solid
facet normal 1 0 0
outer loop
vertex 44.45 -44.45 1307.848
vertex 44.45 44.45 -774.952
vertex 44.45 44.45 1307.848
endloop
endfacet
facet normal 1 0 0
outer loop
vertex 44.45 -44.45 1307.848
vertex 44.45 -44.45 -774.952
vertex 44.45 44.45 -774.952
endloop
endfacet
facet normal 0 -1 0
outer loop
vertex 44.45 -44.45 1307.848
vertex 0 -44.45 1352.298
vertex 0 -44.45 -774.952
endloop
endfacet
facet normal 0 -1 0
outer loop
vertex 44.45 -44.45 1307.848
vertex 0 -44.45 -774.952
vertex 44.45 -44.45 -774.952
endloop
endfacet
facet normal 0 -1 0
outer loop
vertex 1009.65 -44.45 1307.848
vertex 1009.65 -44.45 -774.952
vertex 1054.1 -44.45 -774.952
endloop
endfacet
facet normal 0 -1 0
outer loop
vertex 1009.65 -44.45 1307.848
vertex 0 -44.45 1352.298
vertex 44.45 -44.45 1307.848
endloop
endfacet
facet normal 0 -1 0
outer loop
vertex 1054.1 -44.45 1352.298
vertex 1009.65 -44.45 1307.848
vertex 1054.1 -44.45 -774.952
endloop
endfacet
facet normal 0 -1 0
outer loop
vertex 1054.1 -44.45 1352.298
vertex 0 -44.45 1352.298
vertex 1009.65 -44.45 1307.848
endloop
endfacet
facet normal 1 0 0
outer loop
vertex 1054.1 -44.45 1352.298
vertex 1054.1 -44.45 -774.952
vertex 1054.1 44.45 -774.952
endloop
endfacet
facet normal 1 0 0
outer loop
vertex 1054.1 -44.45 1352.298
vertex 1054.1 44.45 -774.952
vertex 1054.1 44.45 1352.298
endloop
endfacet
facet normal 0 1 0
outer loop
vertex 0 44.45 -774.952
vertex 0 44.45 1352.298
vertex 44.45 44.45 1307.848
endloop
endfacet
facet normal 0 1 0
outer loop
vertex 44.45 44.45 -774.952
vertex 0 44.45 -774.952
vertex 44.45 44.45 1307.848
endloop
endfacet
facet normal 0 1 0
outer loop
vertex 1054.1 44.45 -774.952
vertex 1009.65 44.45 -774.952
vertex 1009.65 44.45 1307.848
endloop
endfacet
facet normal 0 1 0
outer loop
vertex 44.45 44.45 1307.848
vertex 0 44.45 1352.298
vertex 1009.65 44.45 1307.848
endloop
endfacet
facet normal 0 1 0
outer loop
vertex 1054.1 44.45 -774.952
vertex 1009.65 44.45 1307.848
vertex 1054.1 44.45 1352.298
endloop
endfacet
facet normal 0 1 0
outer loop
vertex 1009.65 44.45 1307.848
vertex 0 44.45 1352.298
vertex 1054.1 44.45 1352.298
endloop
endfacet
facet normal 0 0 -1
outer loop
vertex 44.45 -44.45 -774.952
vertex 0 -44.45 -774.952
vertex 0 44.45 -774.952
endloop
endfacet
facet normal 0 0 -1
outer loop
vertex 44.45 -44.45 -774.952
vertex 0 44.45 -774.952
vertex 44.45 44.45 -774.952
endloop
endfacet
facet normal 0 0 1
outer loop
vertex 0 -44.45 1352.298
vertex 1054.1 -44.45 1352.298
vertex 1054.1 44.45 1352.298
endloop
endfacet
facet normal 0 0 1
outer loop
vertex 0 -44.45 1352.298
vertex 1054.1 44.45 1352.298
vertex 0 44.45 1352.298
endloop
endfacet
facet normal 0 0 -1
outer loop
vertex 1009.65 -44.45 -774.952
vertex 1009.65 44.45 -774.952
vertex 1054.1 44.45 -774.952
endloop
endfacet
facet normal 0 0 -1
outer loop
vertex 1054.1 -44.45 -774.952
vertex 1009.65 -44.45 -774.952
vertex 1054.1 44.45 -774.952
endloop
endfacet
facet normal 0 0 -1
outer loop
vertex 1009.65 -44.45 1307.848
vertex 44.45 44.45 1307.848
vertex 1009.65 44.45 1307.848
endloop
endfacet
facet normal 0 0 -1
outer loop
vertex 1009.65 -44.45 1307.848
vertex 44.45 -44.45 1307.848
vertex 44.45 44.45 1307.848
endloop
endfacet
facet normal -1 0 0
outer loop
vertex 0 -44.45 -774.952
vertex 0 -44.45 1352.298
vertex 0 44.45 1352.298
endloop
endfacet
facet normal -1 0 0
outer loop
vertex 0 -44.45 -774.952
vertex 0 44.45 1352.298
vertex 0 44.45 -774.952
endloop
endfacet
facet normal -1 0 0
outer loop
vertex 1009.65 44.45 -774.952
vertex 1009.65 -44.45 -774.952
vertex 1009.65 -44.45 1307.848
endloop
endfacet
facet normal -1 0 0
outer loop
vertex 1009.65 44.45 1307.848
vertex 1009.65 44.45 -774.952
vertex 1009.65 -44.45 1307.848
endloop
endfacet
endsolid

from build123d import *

# Parameters (mm, degrees)
F0_W     = 44.45
F0_H     = 2082.8
F1_DEPTH = 44.45


with BuildPart() as f1:
    # F0 (on Front) → F1 (new body, symmetric)
    with BuildSketch(Plane.XZ):
        with Locations((1031.875, 266.447886)):
            Rectangle(F0_W, F0_H)
        with Locations((22.225, 266.447886)):
            Rectangle(F0_W, F0_H)
        Polygon((0, 1307.847886), (44.45, 1307.847886), (1009.65, 1307.847886), (1054.1, 1307.847886), (1054.1, 1352.297886), (527.05, 1352.297886), (0, 1352.297886), align=None)
    extrude(amount=F1_DEPTH, both=True)


solid = f1.part
